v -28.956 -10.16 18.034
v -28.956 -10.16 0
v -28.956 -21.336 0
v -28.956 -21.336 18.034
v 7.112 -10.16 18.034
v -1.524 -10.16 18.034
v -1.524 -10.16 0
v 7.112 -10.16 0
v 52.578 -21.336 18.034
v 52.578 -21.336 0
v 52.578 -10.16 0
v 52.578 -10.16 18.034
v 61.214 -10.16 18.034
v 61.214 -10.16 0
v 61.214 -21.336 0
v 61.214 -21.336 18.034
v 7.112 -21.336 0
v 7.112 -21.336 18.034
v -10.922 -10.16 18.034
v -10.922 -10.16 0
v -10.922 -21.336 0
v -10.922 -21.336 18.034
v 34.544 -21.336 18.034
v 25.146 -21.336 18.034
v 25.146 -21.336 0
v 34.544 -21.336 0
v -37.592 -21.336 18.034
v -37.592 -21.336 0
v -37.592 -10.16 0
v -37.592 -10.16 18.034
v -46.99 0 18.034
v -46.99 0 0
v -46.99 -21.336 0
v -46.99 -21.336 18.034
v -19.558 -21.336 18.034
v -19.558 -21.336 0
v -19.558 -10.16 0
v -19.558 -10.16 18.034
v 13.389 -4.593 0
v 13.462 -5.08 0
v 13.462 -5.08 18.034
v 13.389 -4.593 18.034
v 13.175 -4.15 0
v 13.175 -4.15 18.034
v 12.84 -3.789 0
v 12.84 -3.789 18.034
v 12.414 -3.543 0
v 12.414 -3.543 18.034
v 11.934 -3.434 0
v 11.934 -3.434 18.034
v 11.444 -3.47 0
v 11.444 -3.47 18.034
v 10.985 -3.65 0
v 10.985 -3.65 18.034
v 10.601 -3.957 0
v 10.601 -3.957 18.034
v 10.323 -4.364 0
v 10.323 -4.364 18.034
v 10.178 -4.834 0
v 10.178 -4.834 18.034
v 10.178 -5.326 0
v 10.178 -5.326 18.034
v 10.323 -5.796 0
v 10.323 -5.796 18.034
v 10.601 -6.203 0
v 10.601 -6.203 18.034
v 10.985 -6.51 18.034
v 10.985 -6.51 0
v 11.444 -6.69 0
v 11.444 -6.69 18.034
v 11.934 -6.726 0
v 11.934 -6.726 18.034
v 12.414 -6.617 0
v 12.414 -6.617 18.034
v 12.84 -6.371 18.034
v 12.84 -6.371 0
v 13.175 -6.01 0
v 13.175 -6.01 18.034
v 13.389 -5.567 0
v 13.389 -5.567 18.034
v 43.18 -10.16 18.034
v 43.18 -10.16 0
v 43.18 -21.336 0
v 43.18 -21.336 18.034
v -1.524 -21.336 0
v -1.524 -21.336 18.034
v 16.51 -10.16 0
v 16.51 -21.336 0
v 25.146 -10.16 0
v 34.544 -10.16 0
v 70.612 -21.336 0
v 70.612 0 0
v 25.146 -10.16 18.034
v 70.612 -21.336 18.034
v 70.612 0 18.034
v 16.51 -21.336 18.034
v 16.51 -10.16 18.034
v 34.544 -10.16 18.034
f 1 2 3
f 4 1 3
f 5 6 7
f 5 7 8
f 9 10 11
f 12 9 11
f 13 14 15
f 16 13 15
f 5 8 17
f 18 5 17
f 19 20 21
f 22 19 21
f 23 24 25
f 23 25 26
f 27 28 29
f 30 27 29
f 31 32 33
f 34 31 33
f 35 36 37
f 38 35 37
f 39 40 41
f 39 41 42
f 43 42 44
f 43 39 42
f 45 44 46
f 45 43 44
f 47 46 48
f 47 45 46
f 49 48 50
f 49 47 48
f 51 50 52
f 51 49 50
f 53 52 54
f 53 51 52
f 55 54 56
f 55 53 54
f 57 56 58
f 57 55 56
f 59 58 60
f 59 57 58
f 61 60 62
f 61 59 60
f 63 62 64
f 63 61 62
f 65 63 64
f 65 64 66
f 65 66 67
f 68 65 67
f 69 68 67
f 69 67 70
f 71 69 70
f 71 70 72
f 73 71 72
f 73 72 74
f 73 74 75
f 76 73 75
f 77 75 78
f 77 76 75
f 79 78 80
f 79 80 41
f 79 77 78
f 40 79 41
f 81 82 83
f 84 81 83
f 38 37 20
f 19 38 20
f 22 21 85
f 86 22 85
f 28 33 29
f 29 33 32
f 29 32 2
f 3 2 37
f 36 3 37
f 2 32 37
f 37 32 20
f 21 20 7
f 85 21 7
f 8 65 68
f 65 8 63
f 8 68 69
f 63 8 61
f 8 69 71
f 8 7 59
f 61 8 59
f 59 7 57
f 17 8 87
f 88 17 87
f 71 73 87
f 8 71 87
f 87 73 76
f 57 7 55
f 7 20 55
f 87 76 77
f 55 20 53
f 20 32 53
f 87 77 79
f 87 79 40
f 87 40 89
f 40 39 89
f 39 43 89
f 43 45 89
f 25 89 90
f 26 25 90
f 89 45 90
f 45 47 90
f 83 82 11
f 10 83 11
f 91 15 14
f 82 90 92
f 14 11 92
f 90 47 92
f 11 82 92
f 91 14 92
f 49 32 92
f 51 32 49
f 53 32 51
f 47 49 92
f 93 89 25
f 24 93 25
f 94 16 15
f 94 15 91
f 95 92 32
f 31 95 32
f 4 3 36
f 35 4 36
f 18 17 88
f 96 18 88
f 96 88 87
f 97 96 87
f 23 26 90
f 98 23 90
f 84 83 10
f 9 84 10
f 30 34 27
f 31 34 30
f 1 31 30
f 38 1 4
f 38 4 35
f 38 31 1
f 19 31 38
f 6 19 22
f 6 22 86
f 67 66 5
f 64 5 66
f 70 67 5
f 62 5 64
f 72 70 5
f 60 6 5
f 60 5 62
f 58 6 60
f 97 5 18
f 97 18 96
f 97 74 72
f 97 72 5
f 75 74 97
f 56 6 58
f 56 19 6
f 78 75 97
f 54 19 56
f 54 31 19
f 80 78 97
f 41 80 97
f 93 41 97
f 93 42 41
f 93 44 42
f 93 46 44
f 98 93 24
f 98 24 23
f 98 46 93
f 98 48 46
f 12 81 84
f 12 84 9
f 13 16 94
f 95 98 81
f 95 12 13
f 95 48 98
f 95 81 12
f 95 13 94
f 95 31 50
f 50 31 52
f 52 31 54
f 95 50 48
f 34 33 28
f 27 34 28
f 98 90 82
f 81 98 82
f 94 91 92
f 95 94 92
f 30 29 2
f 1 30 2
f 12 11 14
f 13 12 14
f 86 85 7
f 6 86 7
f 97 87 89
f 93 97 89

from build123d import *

# Parameters (mm, degrees)
F0_R     = 1.651
F1_DEPTH = 18.034


with BuildPart() as f1:
    # F0 (on Top) → F1 (new body)
    with BuildSketch(Plane.XY):
        Polygon((70.612, 0), (-46.99, 0), (-46.99, -21.336), (-37.592, -21.336), (-37.592, -10.16), (-28.956, -10.16), (-28.956, -21.336), (-19.558, -21.336), (-19.558, -10.16), (-10.922, -10.16), (-10.922, -21.336), (-1.524, -21.336), (-1.524, -10.16), (7.112, -10.16), (7.112, -21.336), (16.51, -21.336), (16.51, -10.16), (25.146, -10.16), (25.146, -21.336), (34.544, -21.336), (34.544, -10.16), (43.18, -10.16), (43.18, -21.336), (52.578, -21.336), (52.578, -10.16), (61.214, -10.16), (61.214, -21.336), (70.612, -21.336), align=None)
        with Locations((11.810999, -5.08)):
            Circle(F0_R, mode=Mode.SUBTRACT)
    extrude(amount=F1_DEPTH)


solid = f1.part
